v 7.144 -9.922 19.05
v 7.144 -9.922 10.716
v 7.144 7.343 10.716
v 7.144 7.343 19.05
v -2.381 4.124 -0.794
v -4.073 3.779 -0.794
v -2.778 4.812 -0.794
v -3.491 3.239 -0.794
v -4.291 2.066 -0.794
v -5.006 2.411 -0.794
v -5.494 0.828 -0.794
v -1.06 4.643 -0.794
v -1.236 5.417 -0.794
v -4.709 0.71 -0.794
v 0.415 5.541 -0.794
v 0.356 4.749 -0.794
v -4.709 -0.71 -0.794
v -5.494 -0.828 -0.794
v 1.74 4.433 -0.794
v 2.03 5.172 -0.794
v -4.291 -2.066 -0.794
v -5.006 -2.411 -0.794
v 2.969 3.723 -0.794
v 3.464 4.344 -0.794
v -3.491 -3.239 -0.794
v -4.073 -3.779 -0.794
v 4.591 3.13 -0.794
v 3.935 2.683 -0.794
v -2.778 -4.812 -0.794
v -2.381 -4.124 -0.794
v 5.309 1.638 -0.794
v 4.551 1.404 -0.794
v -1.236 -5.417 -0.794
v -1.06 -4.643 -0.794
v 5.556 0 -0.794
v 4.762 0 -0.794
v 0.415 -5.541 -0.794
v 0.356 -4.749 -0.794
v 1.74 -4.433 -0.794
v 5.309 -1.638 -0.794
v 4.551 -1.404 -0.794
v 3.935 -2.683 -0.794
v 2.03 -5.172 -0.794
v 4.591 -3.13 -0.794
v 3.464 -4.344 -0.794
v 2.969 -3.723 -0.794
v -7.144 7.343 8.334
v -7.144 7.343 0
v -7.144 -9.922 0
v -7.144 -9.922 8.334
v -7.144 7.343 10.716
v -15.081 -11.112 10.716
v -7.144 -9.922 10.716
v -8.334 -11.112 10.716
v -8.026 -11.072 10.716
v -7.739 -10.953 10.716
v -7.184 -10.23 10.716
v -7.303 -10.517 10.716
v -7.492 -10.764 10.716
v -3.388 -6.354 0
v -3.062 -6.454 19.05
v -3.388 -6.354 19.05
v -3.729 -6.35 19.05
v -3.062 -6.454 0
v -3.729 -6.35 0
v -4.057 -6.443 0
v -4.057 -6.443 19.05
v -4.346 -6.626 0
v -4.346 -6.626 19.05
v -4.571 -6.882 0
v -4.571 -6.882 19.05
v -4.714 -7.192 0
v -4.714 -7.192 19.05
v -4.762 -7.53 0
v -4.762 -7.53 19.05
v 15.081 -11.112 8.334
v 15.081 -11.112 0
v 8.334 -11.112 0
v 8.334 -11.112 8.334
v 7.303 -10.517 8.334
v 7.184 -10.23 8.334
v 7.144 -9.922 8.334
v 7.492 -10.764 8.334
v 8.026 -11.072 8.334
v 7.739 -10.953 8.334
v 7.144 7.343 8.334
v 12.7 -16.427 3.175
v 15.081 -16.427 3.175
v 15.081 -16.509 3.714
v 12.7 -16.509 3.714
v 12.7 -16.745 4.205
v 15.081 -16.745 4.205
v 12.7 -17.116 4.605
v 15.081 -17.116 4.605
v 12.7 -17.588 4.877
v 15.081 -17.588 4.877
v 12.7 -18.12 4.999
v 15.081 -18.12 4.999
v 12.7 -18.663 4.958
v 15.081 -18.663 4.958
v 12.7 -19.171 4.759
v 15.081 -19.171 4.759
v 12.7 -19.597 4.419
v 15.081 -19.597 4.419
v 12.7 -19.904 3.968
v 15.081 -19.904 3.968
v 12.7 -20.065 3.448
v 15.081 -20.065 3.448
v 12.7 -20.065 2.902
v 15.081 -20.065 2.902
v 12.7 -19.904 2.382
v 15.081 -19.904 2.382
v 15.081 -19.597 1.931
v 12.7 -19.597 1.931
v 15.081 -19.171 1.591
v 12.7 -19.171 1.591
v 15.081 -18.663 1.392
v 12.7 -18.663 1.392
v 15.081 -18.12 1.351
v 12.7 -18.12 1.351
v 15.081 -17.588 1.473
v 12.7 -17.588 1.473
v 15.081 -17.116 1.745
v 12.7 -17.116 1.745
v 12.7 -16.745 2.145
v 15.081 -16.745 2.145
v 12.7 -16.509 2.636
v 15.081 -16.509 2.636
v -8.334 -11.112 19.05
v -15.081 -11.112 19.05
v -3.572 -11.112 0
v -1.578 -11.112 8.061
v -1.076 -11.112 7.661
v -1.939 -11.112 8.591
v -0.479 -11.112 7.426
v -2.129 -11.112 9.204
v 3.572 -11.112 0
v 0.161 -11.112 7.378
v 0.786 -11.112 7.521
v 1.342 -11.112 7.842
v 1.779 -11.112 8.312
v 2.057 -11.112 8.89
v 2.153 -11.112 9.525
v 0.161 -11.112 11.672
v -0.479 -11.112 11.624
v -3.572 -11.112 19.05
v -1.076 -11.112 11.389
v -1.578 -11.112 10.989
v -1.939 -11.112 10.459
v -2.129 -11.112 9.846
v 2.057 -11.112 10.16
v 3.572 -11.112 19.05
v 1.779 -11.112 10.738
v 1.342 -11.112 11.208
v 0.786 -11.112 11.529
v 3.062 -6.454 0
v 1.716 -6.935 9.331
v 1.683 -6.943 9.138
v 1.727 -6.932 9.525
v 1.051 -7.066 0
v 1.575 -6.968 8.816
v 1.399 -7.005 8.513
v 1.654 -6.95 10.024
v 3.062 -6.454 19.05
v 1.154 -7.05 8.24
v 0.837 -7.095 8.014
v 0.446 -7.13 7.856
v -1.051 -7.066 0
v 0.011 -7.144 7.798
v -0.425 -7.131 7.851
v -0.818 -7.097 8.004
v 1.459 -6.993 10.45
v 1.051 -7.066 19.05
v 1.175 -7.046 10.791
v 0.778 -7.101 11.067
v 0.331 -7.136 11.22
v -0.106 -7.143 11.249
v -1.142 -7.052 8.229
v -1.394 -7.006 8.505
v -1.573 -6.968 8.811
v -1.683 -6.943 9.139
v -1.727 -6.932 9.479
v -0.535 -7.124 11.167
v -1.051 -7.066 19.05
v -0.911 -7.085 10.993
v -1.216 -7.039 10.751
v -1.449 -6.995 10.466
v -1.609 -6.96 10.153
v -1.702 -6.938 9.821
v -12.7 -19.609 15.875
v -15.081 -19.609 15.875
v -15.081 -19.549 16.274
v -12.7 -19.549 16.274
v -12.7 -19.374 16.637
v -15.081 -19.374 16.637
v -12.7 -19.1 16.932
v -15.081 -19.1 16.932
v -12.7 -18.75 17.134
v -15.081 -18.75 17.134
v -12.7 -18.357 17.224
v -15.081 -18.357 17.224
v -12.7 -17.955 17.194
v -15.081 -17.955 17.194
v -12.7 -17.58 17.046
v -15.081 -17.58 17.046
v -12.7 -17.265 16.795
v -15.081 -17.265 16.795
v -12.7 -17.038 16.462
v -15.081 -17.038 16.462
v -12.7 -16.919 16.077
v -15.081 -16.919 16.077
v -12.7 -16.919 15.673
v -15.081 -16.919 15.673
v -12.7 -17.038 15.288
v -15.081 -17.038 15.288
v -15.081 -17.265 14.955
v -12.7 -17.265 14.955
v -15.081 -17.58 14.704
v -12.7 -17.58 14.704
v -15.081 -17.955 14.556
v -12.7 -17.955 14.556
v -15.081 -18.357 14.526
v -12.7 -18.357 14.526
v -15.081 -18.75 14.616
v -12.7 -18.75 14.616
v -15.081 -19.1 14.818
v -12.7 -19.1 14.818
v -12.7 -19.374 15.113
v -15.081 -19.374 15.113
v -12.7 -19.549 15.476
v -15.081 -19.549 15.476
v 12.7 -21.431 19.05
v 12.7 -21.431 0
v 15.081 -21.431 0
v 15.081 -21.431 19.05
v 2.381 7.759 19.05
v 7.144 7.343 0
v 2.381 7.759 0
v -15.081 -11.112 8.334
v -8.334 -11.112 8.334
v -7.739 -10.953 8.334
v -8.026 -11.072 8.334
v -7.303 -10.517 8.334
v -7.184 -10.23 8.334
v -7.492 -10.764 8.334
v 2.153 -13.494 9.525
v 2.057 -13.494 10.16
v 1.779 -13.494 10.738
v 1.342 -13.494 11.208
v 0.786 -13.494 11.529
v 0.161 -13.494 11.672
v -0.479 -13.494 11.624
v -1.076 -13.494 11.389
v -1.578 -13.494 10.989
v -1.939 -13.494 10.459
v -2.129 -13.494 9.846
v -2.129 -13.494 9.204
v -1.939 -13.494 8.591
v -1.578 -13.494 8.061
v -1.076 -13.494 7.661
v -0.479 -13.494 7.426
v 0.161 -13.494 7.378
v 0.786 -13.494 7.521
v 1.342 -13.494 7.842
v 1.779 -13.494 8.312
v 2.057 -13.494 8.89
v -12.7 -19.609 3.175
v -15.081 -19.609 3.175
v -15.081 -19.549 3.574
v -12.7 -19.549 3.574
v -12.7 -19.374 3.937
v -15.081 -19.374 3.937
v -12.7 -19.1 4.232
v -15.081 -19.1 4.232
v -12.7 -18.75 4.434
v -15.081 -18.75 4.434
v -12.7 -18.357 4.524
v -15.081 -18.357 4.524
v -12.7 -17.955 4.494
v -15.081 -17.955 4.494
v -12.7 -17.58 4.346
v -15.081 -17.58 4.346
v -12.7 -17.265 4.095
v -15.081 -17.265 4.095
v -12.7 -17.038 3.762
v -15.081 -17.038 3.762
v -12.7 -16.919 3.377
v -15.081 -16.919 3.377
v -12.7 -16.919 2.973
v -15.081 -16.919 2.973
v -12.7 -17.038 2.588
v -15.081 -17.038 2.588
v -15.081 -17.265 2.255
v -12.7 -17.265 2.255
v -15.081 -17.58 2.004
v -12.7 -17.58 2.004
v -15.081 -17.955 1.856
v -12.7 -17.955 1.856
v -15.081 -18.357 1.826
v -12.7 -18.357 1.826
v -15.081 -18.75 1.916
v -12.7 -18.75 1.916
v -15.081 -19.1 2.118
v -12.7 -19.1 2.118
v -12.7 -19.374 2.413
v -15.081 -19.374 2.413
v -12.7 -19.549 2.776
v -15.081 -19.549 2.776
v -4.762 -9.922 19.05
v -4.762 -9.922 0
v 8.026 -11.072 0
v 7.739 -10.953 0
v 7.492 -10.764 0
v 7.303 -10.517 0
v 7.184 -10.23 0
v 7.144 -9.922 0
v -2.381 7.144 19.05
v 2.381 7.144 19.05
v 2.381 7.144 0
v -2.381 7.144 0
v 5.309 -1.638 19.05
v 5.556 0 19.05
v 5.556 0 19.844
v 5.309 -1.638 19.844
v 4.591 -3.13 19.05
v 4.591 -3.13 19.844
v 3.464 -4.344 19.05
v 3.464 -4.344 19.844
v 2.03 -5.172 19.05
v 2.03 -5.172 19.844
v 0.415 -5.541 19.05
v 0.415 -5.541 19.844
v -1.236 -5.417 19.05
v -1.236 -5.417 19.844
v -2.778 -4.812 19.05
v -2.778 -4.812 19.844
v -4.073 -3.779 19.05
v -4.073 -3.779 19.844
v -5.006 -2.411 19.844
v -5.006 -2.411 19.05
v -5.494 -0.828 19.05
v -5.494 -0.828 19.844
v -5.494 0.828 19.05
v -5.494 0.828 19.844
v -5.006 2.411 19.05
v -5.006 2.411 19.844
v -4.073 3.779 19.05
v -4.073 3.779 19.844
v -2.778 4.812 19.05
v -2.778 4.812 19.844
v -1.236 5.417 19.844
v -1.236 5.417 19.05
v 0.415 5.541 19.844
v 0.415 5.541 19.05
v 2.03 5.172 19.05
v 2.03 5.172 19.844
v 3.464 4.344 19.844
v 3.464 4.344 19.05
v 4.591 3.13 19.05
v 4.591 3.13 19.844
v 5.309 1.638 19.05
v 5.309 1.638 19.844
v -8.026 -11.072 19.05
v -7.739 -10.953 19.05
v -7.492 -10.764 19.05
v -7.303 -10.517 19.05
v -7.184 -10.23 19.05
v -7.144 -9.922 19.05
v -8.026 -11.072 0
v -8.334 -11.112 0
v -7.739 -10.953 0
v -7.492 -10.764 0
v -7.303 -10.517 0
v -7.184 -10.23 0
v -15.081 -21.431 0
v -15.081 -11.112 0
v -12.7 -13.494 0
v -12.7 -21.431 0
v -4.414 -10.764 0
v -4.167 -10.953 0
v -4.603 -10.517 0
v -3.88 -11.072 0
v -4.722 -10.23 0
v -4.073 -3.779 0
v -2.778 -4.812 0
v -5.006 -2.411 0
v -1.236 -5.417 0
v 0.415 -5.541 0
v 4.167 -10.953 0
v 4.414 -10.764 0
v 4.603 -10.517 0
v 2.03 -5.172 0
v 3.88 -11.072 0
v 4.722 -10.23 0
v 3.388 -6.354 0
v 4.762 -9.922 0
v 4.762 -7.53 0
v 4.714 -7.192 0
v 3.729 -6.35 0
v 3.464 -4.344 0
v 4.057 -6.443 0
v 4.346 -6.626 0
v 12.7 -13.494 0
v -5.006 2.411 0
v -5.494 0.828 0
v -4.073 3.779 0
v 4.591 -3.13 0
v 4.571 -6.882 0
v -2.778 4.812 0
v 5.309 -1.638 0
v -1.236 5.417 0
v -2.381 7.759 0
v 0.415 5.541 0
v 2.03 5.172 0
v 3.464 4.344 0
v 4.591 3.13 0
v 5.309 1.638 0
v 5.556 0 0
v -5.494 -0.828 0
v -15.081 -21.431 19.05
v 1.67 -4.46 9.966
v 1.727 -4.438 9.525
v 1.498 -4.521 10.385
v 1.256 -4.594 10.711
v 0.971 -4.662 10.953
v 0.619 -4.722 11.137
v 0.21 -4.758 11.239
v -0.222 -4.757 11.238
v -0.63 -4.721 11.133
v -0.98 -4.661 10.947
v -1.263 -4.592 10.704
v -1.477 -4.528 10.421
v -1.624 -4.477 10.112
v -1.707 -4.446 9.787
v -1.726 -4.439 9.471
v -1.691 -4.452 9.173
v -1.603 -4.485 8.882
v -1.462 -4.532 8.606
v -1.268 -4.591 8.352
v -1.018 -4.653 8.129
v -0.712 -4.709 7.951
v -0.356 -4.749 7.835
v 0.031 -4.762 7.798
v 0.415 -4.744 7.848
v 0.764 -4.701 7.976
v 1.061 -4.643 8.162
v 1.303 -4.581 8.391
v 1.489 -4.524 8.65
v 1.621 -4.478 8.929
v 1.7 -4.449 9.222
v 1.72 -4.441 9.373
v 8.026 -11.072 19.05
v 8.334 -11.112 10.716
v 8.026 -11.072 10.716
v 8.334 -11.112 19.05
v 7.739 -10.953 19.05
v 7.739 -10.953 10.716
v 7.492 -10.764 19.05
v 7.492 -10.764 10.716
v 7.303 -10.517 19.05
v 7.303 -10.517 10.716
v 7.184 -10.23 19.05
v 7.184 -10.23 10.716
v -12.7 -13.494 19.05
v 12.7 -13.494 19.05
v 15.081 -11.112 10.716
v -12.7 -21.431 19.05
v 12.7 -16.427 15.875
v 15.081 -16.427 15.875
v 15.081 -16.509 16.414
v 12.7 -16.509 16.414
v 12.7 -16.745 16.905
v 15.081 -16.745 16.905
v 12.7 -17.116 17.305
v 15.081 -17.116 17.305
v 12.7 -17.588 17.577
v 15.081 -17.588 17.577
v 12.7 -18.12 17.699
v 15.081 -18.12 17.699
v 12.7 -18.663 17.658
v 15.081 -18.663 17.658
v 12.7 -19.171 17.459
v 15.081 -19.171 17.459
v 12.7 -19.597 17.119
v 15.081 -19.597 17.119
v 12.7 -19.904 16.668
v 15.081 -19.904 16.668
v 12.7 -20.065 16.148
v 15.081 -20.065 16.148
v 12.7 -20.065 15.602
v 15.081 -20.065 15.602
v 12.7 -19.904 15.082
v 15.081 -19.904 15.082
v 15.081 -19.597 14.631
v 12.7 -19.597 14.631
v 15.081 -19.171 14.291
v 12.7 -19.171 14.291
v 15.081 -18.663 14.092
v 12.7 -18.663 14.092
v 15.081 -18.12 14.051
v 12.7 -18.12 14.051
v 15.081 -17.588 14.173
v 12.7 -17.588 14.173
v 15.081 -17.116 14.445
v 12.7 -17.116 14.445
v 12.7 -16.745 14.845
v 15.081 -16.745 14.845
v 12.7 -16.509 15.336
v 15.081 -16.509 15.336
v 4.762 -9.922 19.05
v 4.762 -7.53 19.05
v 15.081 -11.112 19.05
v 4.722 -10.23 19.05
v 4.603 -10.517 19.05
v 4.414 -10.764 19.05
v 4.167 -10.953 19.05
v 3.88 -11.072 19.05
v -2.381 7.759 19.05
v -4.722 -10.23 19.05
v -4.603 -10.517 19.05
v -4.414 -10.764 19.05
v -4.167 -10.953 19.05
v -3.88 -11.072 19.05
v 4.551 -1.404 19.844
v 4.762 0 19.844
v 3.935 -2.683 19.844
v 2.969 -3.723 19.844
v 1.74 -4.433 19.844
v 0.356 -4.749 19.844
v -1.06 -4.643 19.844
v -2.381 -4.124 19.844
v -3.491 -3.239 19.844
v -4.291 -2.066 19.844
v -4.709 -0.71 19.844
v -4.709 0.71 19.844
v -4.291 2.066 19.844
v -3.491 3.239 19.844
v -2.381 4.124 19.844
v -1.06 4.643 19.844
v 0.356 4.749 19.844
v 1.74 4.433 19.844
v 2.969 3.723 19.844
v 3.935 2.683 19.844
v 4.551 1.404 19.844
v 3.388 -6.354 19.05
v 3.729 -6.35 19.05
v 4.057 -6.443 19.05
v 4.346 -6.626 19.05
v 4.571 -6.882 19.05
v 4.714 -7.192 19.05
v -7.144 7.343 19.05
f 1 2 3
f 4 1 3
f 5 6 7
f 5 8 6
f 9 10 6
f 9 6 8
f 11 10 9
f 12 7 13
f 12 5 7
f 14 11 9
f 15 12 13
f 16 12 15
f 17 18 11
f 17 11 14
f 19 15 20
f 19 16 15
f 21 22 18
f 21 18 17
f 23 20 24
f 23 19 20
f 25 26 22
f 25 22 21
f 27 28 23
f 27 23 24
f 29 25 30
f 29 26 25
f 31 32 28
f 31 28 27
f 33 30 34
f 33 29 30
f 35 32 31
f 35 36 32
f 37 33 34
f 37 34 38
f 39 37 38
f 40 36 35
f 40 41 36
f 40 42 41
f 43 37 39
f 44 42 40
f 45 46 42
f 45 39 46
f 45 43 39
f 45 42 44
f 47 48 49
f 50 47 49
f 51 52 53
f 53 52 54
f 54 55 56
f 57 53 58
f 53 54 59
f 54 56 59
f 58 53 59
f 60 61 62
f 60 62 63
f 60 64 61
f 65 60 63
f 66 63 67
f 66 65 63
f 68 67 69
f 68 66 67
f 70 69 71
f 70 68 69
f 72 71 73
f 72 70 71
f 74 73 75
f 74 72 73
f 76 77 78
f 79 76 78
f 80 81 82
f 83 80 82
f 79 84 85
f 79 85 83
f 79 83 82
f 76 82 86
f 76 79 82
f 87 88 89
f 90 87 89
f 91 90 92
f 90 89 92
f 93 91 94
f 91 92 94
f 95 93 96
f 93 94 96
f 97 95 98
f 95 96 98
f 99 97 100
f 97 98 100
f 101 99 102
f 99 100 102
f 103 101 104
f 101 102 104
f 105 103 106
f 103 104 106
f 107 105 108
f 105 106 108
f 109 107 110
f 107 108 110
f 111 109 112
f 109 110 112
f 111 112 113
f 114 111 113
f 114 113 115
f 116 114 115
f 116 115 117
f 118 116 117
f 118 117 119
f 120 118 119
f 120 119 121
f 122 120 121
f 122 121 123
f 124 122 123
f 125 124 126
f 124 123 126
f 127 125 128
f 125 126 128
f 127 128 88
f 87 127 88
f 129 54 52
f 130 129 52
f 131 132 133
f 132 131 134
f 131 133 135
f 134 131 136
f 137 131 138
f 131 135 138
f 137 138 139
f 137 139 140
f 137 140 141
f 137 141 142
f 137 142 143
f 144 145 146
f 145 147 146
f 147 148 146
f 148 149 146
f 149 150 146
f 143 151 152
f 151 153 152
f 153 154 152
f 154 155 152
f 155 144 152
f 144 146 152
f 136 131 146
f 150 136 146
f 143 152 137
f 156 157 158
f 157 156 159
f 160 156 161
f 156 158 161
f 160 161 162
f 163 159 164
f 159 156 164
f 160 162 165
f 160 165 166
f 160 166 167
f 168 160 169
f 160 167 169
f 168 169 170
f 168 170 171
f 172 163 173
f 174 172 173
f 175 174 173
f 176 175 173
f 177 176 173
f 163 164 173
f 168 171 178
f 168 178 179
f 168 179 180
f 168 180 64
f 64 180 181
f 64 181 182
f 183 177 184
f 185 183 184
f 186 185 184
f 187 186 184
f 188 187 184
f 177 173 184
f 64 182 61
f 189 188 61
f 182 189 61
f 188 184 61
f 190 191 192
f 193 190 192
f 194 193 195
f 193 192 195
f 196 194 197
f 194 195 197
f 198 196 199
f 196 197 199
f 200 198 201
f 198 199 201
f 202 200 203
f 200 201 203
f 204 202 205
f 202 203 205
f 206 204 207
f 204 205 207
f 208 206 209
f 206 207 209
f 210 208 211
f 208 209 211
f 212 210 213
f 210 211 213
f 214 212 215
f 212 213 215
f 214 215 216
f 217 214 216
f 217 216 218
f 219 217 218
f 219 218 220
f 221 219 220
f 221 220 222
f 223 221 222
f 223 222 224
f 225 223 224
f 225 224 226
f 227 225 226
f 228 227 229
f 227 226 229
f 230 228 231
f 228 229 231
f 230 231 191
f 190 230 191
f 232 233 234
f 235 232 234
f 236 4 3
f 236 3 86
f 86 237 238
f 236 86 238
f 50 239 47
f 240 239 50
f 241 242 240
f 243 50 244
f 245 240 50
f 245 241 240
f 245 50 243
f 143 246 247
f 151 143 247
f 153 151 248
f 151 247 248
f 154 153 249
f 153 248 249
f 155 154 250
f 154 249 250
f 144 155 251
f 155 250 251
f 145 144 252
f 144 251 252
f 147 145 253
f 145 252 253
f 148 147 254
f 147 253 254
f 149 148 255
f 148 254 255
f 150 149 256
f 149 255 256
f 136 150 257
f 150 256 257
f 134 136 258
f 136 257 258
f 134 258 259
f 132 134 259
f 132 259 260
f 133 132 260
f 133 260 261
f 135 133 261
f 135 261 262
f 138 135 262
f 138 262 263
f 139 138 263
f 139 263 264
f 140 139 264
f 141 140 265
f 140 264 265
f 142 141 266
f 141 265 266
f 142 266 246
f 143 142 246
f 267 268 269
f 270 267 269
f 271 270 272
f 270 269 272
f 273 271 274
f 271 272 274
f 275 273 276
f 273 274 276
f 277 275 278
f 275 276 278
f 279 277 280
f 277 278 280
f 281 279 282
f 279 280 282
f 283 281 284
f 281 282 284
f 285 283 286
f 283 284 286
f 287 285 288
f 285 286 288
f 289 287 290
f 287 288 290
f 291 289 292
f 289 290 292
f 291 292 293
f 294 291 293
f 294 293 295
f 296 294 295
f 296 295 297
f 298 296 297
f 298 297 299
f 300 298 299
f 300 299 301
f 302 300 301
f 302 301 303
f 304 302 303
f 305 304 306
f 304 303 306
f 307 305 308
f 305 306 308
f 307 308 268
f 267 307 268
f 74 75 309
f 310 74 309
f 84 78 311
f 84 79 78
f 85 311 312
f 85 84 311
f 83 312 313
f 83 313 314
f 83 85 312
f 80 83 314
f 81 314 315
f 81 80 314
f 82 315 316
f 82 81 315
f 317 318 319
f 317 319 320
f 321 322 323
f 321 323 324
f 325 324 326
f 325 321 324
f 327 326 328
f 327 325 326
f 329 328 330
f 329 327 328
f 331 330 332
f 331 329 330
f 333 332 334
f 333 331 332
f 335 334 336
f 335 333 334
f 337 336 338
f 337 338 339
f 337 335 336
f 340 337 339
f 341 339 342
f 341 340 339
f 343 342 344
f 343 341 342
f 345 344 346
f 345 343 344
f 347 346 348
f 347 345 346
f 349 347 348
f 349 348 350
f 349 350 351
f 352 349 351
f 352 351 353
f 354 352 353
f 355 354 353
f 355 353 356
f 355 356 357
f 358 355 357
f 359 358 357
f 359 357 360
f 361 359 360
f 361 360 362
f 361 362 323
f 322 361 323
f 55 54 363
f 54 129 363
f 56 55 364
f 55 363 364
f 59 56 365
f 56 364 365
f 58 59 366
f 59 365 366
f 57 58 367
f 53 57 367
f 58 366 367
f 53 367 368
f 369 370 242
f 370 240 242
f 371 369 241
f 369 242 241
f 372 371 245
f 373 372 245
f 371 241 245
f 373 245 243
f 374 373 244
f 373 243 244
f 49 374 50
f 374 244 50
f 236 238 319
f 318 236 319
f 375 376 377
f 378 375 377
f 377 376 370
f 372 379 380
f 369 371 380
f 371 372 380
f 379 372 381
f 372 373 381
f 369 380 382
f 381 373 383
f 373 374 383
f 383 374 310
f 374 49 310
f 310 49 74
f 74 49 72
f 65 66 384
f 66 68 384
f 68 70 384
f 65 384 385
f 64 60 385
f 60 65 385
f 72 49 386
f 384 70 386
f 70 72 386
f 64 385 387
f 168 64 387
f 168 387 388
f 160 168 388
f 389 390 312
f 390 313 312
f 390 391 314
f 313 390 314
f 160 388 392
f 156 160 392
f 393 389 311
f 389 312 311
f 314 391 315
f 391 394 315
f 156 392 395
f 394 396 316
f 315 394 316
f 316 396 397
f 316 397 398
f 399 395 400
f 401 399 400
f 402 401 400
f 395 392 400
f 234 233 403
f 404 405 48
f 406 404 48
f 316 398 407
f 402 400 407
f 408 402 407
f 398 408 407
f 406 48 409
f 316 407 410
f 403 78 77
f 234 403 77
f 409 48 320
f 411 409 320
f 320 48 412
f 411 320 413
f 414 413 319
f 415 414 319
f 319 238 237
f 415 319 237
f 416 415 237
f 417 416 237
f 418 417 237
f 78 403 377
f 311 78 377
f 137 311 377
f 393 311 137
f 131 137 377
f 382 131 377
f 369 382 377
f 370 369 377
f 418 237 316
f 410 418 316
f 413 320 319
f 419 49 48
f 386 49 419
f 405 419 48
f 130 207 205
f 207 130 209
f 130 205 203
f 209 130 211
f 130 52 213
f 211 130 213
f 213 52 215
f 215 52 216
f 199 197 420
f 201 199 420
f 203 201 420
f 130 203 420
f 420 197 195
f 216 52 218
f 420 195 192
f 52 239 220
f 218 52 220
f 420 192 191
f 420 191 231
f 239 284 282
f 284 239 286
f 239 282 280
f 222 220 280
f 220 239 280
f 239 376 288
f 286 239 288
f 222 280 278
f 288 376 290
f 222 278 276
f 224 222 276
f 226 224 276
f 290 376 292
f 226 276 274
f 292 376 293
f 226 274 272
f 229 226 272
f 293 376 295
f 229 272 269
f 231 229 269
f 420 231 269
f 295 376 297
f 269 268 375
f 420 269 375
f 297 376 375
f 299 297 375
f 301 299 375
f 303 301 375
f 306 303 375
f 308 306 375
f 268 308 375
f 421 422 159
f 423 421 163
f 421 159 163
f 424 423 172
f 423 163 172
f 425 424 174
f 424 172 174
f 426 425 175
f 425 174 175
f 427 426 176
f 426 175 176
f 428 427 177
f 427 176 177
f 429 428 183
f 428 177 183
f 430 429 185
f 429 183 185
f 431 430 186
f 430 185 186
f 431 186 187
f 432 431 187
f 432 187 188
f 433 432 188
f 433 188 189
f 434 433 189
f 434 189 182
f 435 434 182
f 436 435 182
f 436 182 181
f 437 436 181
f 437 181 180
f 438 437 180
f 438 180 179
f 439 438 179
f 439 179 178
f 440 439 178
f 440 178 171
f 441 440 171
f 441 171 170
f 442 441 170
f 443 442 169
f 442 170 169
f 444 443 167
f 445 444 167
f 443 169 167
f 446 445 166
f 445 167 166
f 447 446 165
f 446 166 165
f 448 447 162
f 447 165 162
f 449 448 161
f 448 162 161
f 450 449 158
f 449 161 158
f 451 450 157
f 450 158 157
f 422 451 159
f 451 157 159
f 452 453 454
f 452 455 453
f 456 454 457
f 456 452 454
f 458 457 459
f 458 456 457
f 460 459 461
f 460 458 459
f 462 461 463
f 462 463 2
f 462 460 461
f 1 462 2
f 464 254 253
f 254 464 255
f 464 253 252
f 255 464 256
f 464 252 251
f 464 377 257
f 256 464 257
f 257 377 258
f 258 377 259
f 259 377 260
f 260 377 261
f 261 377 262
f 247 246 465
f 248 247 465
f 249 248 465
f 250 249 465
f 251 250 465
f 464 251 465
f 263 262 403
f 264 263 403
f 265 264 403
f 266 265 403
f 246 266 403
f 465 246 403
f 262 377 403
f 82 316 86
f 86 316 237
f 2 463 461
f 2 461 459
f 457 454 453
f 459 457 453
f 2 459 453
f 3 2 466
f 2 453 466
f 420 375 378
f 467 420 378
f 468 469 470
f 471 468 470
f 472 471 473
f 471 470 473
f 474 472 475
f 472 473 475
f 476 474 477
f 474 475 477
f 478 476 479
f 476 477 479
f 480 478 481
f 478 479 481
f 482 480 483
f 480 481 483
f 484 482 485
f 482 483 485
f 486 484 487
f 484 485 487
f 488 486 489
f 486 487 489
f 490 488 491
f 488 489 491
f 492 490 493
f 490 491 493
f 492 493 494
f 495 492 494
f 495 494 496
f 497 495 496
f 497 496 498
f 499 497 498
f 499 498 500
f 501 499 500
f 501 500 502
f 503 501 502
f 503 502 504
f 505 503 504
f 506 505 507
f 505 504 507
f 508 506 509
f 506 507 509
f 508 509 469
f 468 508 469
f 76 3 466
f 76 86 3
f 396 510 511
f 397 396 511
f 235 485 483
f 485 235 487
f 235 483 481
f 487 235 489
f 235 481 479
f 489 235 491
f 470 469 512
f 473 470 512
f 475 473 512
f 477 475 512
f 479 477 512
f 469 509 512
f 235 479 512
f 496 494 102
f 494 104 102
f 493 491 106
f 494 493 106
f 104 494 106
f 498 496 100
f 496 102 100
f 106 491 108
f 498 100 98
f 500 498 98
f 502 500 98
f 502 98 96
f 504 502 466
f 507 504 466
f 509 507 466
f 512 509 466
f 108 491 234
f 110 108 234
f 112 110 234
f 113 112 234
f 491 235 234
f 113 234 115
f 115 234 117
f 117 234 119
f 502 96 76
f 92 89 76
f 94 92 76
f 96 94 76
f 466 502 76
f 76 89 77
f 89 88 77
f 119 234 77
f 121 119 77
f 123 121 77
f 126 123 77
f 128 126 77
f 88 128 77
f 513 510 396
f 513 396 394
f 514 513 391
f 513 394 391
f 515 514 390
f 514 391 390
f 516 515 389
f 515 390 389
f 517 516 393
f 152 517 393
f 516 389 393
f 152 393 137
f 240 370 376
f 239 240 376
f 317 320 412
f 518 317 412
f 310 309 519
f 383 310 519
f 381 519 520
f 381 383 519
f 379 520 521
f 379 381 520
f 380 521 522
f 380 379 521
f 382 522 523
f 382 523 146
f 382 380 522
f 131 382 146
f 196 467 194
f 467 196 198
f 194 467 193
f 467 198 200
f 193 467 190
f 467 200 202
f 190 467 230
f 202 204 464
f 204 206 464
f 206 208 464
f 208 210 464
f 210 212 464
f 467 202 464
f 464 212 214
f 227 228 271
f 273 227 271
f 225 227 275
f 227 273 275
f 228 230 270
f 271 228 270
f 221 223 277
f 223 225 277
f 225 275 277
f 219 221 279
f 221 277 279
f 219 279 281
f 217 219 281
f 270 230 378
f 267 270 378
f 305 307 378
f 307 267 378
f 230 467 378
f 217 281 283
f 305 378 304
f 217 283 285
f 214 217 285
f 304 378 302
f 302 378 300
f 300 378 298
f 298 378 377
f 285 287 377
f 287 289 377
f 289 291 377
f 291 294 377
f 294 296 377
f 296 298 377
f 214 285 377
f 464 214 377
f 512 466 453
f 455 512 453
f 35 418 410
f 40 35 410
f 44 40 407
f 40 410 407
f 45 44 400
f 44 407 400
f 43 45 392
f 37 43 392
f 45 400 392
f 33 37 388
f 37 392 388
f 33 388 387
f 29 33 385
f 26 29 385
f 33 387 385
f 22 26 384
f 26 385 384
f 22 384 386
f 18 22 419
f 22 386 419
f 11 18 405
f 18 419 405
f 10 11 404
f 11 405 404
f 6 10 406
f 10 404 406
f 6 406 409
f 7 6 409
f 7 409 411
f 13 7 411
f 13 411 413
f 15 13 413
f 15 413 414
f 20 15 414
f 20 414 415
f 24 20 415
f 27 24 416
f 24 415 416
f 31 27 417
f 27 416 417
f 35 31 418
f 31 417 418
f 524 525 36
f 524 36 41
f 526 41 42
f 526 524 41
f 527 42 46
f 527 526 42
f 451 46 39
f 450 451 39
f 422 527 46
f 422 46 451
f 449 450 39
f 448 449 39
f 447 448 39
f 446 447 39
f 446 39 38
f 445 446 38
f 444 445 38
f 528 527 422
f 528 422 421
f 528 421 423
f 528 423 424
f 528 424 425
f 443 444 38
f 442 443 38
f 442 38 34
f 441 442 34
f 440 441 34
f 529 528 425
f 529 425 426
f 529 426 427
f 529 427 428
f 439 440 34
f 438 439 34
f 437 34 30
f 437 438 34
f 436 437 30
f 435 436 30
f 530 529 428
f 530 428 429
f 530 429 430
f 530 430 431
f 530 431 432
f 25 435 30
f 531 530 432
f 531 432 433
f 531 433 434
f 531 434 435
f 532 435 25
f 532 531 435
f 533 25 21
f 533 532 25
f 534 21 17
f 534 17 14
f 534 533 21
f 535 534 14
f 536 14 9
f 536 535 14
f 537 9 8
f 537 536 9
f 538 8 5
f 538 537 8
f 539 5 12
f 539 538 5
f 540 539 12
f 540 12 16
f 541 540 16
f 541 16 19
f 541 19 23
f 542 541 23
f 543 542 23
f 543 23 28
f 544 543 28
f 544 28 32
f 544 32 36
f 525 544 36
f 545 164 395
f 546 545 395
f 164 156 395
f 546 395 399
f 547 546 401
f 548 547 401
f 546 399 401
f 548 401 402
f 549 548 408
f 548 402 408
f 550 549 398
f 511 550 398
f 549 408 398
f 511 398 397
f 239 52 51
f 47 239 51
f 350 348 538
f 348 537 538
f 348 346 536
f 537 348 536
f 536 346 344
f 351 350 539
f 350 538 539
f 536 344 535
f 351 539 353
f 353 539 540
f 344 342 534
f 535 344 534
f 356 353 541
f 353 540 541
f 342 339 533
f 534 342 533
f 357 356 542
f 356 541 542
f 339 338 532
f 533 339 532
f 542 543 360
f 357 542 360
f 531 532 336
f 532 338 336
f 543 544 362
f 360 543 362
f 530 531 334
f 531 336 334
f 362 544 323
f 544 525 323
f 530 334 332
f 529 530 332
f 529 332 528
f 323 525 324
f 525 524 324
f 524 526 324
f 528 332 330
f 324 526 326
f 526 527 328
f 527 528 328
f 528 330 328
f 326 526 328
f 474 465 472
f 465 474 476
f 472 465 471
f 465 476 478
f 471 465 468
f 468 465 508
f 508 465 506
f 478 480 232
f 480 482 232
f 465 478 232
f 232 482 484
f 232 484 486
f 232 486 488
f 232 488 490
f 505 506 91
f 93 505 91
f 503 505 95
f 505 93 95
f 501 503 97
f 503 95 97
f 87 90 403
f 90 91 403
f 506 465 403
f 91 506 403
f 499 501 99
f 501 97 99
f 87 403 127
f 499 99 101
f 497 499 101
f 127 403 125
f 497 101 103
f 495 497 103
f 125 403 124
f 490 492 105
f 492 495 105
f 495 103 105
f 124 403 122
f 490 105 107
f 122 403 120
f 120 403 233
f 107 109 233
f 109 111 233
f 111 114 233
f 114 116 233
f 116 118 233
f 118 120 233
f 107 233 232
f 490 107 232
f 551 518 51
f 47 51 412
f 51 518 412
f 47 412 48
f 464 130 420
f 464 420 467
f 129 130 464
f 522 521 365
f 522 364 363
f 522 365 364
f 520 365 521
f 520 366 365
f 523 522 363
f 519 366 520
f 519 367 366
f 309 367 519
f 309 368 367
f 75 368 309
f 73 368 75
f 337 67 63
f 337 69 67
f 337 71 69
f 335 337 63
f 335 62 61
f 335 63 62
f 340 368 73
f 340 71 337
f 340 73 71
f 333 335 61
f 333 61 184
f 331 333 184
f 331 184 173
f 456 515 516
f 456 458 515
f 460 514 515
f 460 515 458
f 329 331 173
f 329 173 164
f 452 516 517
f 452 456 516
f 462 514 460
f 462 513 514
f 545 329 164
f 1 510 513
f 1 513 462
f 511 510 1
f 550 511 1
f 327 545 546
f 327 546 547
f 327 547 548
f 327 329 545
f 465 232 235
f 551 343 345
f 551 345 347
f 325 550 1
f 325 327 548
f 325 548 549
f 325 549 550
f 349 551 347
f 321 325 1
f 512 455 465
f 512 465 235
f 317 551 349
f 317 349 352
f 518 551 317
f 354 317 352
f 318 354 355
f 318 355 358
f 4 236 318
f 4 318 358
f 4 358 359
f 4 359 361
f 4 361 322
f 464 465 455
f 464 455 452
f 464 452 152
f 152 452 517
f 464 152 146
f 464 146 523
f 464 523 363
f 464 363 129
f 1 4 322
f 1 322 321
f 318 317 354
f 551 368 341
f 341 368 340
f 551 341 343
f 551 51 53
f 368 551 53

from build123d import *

# Parameters (mm, degrees)
F0_R           = 4.7625
F1_DEPTH       = 19.05
F2_R           = 1.8288
F3_DEPTH       = 2.38125
F4_R           = 1.35255
F5_DEPTH       = 2.38125
F8_DEPTH       = 1.190625
F9_R           = 5.55625
F9_R_2         = 4.7625
F11_DEPTH      = 0.79375
F11_DEPTH_BACK = 19.84375
F12_R          = 1.7272
F13_DEPTH      = 10.0554862042
F15_DEPTH      = 19.05
F16_R          = 2.15265
F17_DEPTH      = 2.38125
F18_R          = 1.190625


with BuildPart() as f1:
    # F0 (on Top) → F1 (new body)
    with BuildSketch(Plane.XY):
        Polygon((-12.7, -13.49375), (12.7, -13.49375), (12.7, -21.43125), (15.08125, -21.43125), (15.08125, -11.1125), (7.14375, -11.1125), (7.14375, 7.3428228204), (2.38125, 7.7594875805), (2.38125, 7.14375), (-2.38125, 7.14375), (-2.38125, 7.7594875805), (-7.14375, 7.3428228204), (-7.14375, -11.1125), (-15.08125, -11.1125), (-15.08125, -21.43125), (-12.7, -21.43125), align=None)
        Circle(F0_R, mode=Mode.SUBTRACT)
    extrude(amount=F1_DEPTH)

    # F2 (on face) → F3 (cut, through all)
    with BuildSketch(Plane.YZ.offset(15.08125)):
        with Locations((-18.25625, 15.875)):
            Circle(F2_R)
        with Locations((-18.25625, 3.175)):
            Circle(F2_R)
    extrude(amount=-F3_DEPTH, mode=Mode.SUBTRACT)

    # F4 (on face) → F5 (cut, through all)
    with BuildSketch(Plane(origin=(-15.08125, 0, 0), x_dir=(0, -1, 0), z_dir=(-1, 0, 0))):
        with Locations((18.25625, 3.175)):
            Circle(F4_R)
        with Locations((18.25625, 15.875)):
            Circle(F4_R)
    extrude(amount=-F5_DEPTH, mode=Mode.SUBTRACT)

    # F7 (on offset) → F8 (join, symmetric)
    with BuildSketch(Plane(origin=(0, 0, 9.525), x_dir=(1, 0, 0), z_dir=(0, 0, -1))):
        Polygon((-15.08125, 11.1125), (-7.14375, -7.3428228204), (-7.14375, 11.1125), align=None)
        Polygon((15.08125, 11.1125), (7.14375, 11.1125), (7.14375, -7.3428228204), align=None)
    extrude(amount=F8_DEPTH, both=True)

    # F9 (on face) → F11 (join, two sides)
    with BuildSketch(Plane(origin=(0, 0, 0), x_dir=(1, 0, 0), z_dir=(0, 0, -1))) as f11_sk:
        Circle(F9_R)
        Circle(F9_R_2, mode=Mode.SUBTRACT)
    extrude(amount=F11_DEPTH)
    extrude(f11_sk.sketch, amount=-F11_DEPTH_BACK)

    # F12 (on face) → F13 (cut, up to face)
    with BuildSketch(Plane.XZ.offset(13.49375)):
        with Locations((0, 9.525)):
            Circle(F12_R)
    extrude(amount=-F13_DEPTH, mode=Mode.SUBTRACT)

    # F14 (on face) → F15 (cut, through all)
    with BuildSketch(Plane.XY.offset(19.05)):
        with BuildLine():
            Line((-4.7625, -5.3246368714), (-4.7625, -11.1125))
            Line((-4.7625, -11.1125), (4.7625, -11.1125))
            Line((4.7625, -11.1125), (4.7625, -5.3246368714))
            ThreePointArc((4.7625, -5.3246368714), (0, -7.14375), (-4.7625, -5.3246368714))
        make_face()
    extrude(amount=-F15_DEPTH, mode=Mode.SUBTRACT)

    # F16 (on face) → F17 (cut, through all)
    with BuildSketch(Plane.XZ.offset(13.49375)):
        with Locations((0, 9.525)):
            Circle(F16_R)
    extrude(amount=-F17_DEPTH, mode=Mode.SUBTRACT)

    # F18
    f18_edges = [f1.edges().sort_by_distance(p)[0] for p in [
        (7.14375, -11.1125, 4.167187),
        (7.14375, -11.1125, 14.882812),
        (-7.14375, -11.1125, 4.167187),
        (-7.14375, -11.1125, 14.882812),
        (-4.7625, -11.1125, 9.525),
        (4.7625, -11.1125, 9.525),
        (4.7625, -5.324637, 9.525),
        (-4.7625, -5.324637, 9.525),
    ]]
    fillet(f18_edges, radius=F18_R)


solid = f1.part
